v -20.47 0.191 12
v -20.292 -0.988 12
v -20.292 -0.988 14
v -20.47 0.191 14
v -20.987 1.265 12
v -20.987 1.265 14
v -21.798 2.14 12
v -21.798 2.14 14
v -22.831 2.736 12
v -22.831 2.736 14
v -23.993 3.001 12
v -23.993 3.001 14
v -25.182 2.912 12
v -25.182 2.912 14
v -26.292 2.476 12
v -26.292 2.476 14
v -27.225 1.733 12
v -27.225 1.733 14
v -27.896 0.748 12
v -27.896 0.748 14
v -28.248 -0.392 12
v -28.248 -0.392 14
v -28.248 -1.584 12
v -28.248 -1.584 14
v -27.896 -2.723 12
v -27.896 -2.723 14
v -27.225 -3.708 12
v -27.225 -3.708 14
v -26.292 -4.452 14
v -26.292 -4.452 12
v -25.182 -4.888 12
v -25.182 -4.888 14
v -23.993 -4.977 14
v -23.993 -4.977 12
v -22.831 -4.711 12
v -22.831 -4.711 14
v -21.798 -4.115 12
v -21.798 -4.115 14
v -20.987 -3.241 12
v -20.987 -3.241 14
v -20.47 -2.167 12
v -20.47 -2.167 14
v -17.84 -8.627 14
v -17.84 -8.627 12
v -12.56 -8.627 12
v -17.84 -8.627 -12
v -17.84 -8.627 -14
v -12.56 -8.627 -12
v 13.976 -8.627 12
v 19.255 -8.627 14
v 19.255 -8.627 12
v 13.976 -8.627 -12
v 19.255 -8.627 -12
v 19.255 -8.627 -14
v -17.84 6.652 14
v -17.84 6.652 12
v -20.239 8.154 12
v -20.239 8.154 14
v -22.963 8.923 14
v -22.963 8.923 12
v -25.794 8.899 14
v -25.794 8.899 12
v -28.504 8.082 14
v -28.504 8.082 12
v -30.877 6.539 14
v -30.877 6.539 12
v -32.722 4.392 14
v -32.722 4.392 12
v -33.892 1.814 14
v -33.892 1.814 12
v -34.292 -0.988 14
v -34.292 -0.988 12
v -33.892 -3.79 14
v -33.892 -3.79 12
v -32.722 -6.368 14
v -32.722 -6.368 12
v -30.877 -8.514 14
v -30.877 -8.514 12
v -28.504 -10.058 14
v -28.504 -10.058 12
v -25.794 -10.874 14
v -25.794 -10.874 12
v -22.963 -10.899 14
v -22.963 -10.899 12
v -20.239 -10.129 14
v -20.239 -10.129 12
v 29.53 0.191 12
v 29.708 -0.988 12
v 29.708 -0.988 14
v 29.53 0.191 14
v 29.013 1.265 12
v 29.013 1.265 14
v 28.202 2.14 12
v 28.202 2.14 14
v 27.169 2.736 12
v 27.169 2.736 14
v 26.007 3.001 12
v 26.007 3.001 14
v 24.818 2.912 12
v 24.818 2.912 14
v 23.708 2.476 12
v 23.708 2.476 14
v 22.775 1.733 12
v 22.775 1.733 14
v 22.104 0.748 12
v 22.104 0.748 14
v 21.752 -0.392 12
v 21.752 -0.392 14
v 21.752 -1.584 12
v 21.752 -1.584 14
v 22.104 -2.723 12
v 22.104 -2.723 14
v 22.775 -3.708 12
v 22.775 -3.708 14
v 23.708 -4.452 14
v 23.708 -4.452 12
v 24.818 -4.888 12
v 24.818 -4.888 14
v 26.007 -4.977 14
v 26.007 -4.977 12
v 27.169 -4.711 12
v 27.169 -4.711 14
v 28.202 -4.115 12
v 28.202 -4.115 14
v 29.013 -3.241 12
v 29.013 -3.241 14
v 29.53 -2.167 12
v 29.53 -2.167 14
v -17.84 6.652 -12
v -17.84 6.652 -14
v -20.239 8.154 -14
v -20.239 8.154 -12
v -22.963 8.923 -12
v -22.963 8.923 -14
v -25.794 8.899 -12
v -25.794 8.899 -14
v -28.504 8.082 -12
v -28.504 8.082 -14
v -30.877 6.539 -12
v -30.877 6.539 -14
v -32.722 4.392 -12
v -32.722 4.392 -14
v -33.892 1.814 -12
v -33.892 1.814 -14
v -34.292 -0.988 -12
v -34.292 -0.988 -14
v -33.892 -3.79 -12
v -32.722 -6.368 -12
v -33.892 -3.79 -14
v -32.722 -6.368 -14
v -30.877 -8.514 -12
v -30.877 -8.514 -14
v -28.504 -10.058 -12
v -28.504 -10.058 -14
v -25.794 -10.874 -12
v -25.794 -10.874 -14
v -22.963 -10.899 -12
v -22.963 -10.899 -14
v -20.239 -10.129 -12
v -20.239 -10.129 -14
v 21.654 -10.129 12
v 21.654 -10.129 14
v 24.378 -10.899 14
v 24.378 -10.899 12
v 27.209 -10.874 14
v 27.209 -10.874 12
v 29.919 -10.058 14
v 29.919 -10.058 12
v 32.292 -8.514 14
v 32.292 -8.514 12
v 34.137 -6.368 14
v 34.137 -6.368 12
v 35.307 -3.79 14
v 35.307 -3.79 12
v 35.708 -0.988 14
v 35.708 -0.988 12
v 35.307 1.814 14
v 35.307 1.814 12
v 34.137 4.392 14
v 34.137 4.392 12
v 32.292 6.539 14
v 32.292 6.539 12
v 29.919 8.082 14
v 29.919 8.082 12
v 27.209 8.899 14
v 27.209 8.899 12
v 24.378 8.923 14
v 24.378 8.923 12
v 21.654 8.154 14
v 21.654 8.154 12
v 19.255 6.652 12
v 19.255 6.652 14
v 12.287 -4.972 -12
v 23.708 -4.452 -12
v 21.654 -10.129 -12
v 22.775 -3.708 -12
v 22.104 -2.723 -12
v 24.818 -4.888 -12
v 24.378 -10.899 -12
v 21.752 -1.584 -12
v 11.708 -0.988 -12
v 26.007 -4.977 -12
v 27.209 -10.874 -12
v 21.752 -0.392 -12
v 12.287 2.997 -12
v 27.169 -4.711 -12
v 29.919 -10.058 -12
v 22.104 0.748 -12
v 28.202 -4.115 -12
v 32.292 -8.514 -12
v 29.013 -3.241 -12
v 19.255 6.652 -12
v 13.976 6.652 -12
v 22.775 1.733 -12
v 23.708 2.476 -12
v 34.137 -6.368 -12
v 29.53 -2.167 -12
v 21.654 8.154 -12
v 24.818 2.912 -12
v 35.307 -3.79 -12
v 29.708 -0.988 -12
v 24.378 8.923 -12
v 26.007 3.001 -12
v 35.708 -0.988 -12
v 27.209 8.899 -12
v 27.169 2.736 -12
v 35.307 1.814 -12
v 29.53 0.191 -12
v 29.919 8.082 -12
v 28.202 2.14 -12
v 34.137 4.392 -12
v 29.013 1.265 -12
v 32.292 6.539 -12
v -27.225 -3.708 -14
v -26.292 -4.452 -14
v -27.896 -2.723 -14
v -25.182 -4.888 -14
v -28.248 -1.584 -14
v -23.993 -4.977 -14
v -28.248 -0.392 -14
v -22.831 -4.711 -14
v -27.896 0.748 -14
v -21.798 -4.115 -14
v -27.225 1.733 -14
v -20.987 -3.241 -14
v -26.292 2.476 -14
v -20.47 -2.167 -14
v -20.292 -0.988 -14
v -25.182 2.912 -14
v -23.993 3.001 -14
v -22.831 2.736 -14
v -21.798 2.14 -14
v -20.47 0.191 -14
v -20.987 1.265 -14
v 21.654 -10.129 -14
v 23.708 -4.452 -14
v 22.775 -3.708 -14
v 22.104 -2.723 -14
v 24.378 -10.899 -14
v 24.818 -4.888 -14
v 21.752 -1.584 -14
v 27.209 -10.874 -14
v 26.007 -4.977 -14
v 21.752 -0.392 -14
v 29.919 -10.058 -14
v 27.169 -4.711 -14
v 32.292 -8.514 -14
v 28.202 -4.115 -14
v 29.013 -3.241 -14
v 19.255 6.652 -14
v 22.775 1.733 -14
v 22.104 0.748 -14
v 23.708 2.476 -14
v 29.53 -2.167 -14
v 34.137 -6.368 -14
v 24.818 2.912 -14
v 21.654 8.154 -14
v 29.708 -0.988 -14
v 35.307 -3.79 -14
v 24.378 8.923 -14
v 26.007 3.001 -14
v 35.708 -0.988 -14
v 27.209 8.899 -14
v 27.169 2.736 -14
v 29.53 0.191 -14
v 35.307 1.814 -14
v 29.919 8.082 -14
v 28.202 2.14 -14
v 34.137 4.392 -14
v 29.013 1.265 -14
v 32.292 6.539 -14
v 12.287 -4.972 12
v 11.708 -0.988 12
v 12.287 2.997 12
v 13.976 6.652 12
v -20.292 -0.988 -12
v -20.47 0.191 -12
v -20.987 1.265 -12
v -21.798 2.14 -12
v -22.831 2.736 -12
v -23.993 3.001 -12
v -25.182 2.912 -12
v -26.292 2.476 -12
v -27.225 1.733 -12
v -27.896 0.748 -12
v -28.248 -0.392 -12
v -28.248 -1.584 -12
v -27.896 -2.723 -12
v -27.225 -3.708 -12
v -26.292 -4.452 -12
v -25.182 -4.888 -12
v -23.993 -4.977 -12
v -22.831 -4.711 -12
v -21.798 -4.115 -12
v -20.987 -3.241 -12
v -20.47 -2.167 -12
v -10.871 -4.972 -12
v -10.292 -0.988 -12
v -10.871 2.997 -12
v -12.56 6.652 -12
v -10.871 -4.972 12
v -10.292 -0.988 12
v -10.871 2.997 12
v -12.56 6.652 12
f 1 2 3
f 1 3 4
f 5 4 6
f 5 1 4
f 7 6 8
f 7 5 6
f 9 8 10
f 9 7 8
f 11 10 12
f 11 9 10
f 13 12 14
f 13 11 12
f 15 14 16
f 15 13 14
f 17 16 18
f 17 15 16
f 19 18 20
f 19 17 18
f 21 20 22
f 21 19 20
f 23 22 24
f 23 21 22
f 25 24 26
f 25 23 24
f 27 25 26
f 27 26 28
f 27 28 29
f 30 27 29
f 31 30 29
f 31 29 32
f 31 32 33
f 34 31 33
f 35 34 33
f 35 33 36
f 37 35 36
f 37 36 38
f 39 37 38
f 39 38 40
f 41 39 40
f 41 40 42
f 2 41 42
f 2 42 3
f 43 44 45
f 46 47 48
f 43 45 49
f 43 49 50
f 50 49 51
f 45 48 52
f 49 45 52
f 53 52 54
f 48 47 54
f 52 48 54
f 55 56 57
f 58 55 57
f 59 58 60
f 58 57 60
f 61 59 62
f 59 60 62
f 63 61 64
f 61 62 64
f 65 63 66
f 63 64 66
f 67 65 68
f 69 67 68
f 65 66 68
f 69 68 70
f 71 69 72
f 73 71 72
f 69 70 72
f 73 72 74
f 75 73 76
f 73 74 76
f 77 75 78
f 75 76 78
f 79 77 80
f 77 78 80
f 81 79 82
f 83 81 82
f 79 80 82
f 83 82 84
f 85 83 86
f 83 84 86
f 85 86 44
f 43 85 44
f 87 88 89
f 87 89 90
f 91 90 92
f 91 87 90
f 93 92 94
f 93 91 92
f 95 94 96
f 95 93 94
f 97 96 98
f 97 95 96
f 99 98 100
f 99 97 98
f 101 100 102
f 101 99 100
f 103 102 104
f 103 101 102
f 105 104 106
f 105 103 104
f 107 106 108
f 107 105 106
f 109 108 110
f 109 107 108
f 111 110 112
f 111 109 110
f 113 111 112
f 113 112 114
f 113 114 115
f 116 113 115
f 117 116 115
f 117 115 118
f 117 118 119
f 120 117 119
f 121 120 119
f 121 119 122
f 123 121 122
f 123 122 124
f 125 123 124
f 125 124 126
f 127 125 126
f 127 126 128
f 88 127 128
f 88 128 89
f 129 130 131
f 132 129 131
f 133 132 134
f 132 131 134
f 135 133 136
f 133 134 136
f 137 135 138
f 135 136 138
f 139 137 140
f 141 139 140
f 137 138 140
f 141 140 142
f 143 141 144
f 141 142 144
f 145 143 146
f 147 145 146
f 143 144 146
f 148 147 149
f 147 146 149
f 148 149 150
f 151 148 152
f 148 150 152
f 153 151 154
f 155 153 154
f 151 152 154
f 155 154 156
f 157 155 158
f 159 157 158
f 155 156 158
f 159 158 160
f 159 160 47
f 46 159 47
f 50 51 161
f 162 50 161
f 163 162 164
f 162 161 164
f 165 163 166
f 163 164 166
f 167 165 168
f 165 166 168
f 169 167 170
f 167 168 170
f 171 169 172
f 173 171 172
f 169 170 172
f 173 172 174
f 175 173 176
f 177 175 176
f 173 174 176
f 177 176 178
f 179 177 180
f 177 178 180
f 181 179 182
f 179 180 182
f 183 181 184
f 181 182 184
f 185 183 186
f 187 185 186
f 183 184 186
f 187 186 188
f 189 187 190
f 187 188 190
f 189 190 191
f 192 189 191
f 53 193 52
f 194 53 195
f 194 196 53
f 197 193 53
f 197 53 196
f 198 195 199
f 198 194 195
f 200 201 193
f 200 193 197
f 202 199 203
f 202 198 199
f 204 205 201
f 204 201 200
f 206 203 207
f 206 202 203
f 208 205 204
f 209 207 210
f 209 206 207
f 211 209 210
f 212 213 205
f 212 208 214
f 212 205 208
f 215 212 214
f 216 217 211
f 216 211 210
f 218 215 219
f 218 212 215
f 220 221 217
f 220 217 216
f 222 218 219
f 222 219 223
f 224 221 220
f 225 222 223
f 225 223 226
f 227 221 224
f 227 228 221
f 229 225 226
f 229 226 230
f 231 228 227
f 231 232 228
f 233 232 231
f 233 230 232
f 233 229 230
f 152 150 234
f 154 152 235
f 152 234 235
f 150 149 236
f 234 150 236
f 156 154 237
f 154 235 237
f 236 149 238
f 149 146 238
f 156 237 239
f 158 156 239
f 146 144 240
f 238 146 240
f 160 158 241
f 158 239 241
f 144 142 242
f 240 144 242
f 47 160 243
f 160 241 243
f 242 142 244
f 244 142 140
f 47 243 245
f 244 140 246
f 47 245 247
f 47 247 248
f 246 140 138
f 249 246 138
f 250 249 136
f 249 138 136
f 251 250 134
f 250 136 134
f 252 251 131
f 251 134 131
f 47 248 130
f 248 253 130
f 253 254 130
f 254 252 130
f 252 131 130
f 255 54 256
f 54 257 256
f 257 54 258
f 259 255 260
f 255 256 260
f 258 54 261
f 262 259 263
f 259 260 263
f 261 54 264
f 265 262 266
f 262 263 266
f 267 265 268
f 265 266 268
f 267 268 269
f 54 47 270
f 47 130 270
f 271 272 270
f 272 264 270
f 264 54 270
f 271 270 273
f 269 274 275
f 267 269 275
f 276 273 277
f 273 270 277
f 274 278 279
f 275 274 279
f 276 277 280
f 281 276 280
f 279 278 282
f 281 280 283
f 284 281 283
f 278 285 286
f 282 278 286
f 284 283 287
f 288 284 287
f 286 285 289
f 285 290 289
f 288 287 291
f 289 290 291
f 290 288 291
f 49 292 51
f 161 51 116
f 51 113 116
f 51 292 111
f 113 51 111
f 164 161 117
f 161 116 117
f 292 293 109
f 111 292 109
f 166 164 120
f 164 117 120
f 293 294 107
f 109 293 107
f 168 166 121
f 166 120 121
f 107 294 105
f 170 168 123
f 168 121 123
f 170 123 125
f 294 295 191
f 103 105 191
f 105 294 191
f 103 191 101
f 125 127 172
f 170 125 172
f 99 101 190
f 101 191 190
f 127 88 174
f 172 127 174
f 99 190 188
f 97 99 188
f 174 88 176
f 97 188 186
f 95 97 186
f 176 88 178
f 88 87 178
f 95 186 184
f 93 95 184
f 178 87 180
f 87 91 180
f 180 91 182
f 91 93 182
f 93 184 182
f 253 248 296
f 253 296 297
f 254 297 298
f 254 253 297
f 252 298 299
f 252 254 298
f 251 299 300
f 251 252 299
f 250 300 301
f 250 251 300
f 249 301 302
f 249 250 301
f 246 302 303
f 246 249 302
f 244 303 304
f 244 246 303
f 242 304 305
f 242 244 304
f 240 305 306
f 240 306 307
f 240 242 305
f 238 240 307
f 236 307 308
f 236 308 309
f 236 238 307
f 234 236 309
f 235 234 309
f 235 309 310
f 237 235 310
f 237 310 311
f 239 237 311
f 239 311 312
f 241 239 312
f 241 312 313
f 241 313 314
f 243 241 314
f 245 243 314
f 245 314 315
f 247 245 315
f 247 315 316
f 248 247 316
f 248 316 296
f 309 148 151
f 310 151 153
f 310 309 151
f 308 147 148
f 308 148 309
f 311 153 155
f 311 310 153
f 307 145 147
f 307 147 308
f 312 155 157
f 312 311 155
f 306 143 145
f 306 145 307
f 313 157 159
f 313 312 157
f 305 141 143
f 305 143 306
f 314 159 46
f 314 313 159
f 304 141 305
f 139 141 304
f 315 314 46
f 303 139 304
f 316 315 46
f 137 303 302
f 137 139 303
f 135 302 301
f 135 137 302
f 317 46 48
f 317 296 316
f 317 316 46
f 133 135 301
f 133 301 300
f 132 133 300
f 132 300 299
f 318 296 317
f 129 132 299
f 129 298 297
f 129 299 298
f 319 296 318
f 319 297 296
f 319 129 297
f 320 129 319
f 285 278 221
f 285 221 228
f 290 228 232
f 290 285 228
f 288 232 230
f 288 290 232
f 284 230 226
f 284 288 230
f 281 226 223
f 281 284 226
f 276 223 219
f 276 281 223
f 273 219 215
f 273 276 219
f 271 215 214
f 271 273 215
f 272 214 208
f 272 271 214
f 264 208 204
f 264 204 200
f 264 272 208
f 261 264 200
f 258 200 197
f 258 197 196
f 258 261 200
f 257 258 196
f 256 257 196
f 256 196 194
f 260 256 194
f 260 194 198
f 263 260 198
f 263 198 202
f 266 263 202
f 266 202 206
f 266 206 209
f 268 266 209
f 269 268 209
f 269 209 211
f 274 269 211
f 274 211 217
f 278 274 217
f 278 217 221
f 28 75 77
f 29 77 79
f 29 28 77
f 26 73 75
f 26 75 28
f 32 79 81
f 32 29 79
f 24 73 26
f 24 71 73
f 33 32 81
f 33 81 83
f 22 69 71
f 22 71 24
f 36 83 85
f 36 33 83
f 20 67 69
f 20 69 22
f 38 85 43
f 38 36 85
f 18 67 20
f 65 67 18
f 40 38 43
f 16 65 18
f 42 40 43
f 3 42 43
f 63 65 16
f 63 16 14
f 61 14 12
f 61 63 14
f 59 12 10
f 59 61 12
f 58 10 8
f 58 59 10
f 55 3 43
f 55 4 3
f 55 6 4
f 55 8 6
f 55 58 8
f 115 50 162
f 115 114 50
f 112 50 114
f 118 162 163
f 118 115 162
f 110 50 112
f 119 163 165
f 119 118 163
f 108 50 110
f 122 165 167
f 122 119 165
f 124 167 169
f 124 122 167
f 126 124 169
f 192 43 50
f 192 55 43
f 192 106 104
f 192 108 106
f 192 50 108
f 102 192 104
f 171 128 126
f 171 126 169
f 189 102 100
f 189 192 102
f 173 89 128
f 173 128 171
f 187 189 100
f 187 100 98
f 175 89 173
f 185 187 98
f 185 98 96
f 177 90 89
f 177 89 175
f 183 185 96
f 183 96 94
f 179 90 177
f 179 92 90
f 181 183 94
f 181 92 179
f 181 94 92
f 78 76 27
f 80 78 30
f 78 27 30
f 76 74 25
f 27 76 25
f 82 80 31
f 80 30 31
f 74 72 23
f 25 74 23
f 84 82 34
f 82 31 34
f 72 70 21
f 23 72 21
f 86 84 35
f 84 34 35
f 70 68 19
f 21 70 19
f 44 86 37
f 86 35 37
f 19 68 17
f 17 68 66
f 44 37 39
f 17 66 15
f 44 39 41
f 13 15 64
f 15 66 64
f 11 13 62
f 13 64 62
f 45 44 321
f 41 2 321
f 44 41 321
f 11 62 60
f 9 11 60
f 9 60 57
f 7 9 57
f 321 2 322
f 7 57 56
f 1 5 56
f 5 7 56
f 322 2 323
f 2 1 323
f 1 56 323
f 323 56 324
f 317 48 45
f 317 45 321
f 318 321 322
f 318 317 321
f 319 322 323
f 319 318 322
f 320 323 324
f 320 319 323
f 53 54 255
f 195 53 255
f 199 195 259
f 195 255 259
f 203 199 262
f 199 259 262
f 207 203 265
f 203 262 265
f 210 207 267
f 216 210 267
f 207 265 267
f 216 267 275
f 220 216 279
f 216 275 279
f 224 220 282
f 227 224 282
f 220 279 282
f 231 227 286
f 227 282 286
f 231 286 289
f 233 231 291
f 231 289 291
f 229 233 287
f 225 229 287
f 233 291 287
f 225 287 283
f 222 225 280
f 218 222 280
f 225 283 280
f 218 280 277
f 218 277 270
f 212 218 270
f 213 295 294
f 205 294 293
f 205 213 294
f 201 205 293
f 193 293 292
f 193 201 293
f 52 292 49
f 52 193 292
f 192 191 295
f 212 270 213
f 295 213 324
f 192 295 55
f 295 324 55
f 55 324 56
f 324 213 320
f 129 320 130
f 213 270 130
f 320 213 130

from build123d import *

# Parameters (mm, degrees)
BOSS_EXTRUDE1_DEPTH         = 14
BOSS_EXTRUDE1_DEPTH_BACK    = 14
SKETCH1_R                   = 4
CUT_EXTRUDE_THIN9_START     = -12
CUT_EXTRUDE_THIN9_OUTLINE_R = 4
CUT_EXTRUDE_THIN9_DEPTH     = 24


# Read off the part's stored shape, not the designer's step: Cut-Extrude-Thin9
with BuildPart() as part:
    # Sketch1 → Boss-Extrude1 (new, two sides: drawn at the far end of the back side and taken through both)
    with BuildSketch(Plane.XY.offset(-BOSS_EXTRUDE1_DEPTH_BACK)):
        with BuildLine():
            ThreePointArc((-17.839605582, 6.651694239), (-34.292375842, -0.987792391), (-17.839605582, -8.627279021))
            Line((-17.839605582, -8.627279021), (19.254853898, -8.627279021))
            ThreePointArc((19.254853898, -8.627279021), (35.707624158, -0.987792391), (19.254853898, 6.651694239))
            Line((19.254853898, 6.651694239), (-17.839605582, 6.651694239))
        make_face()
        with Locations((-24.292375842, -0.987792391)):
            Circle(SKETCH1_R, mode=Mode.SUBTRACT)
        with Locations((25.707624158, -0.987792391)):
            Circle(SKETCH1_R, mode=Mode.SUBTRACT)
    extrude(amount=BOSS_EXTRUDE1_DEPTH + BOSS_EXTRUDE1_DEPTH_BACK)

    # Cut-Extrude-Thin9 outline → Cut-Extrude-Thin9 (cut)
    # profile 1 of 2: a face of its own
    with BuildSketch(Plane.XY.offset(CUT_EXTRUDE_THIN9_START)):
        with BuildLine():
            ThreePointArc((13.975691494, 6.651694239), (11.707624158, -0.987792391), (13.975691494, -8.627279021))
            Line((13.975691494, -8.627279021), (19.254853898, -8.627279021))
            ThreePointArc((19.254853898, -8.627279021), (35.707624158, -0.987792391), (19.254853898, 6.651694239))
            Line((19.254853898, 6.651694239), (13.975691494, 6.651694239))
        make_face()
        with Locations((25.707624158, -0.987792391)):
            Circle(CUT_EXTRUDE_THIN9_OUTLINE_R, mode=Mode.SUBTRACT)
    # profile 2 of 2: a face of its own
    with BuildSketch(Plane.XY.offset(CUT_EXTRUDE_THIN9_START)):
        with BuildLine():
            Line((-17.839605582, -8.627279021), (-12.560443178, -8.627279021))
            ThreePointArc((-12.560443178, -8.627279021), (-10.292375842, -0.987792391), (-12.560443178, 6.651694239))
            Line((-12.560443178, 6.651694239), (-17.839605582, 6.651694239))
            ThreePointArc((-17.839605582, 6.651694239), (-34.292375842, -0.987792391), (-17.839605582, -8.627279021))
        make_face()
        with Locations((-24.292375842, -0.987792391)):
            Circle(CUT_EXTRUDE_THIN9_OUTLINE_R, mode=Mode.SUBTRACT)
    extrude(amount=CUT_EXTRUDE_THIN9_DEPTH, mode=Mode.SUBTRACT)


solid = part.part
